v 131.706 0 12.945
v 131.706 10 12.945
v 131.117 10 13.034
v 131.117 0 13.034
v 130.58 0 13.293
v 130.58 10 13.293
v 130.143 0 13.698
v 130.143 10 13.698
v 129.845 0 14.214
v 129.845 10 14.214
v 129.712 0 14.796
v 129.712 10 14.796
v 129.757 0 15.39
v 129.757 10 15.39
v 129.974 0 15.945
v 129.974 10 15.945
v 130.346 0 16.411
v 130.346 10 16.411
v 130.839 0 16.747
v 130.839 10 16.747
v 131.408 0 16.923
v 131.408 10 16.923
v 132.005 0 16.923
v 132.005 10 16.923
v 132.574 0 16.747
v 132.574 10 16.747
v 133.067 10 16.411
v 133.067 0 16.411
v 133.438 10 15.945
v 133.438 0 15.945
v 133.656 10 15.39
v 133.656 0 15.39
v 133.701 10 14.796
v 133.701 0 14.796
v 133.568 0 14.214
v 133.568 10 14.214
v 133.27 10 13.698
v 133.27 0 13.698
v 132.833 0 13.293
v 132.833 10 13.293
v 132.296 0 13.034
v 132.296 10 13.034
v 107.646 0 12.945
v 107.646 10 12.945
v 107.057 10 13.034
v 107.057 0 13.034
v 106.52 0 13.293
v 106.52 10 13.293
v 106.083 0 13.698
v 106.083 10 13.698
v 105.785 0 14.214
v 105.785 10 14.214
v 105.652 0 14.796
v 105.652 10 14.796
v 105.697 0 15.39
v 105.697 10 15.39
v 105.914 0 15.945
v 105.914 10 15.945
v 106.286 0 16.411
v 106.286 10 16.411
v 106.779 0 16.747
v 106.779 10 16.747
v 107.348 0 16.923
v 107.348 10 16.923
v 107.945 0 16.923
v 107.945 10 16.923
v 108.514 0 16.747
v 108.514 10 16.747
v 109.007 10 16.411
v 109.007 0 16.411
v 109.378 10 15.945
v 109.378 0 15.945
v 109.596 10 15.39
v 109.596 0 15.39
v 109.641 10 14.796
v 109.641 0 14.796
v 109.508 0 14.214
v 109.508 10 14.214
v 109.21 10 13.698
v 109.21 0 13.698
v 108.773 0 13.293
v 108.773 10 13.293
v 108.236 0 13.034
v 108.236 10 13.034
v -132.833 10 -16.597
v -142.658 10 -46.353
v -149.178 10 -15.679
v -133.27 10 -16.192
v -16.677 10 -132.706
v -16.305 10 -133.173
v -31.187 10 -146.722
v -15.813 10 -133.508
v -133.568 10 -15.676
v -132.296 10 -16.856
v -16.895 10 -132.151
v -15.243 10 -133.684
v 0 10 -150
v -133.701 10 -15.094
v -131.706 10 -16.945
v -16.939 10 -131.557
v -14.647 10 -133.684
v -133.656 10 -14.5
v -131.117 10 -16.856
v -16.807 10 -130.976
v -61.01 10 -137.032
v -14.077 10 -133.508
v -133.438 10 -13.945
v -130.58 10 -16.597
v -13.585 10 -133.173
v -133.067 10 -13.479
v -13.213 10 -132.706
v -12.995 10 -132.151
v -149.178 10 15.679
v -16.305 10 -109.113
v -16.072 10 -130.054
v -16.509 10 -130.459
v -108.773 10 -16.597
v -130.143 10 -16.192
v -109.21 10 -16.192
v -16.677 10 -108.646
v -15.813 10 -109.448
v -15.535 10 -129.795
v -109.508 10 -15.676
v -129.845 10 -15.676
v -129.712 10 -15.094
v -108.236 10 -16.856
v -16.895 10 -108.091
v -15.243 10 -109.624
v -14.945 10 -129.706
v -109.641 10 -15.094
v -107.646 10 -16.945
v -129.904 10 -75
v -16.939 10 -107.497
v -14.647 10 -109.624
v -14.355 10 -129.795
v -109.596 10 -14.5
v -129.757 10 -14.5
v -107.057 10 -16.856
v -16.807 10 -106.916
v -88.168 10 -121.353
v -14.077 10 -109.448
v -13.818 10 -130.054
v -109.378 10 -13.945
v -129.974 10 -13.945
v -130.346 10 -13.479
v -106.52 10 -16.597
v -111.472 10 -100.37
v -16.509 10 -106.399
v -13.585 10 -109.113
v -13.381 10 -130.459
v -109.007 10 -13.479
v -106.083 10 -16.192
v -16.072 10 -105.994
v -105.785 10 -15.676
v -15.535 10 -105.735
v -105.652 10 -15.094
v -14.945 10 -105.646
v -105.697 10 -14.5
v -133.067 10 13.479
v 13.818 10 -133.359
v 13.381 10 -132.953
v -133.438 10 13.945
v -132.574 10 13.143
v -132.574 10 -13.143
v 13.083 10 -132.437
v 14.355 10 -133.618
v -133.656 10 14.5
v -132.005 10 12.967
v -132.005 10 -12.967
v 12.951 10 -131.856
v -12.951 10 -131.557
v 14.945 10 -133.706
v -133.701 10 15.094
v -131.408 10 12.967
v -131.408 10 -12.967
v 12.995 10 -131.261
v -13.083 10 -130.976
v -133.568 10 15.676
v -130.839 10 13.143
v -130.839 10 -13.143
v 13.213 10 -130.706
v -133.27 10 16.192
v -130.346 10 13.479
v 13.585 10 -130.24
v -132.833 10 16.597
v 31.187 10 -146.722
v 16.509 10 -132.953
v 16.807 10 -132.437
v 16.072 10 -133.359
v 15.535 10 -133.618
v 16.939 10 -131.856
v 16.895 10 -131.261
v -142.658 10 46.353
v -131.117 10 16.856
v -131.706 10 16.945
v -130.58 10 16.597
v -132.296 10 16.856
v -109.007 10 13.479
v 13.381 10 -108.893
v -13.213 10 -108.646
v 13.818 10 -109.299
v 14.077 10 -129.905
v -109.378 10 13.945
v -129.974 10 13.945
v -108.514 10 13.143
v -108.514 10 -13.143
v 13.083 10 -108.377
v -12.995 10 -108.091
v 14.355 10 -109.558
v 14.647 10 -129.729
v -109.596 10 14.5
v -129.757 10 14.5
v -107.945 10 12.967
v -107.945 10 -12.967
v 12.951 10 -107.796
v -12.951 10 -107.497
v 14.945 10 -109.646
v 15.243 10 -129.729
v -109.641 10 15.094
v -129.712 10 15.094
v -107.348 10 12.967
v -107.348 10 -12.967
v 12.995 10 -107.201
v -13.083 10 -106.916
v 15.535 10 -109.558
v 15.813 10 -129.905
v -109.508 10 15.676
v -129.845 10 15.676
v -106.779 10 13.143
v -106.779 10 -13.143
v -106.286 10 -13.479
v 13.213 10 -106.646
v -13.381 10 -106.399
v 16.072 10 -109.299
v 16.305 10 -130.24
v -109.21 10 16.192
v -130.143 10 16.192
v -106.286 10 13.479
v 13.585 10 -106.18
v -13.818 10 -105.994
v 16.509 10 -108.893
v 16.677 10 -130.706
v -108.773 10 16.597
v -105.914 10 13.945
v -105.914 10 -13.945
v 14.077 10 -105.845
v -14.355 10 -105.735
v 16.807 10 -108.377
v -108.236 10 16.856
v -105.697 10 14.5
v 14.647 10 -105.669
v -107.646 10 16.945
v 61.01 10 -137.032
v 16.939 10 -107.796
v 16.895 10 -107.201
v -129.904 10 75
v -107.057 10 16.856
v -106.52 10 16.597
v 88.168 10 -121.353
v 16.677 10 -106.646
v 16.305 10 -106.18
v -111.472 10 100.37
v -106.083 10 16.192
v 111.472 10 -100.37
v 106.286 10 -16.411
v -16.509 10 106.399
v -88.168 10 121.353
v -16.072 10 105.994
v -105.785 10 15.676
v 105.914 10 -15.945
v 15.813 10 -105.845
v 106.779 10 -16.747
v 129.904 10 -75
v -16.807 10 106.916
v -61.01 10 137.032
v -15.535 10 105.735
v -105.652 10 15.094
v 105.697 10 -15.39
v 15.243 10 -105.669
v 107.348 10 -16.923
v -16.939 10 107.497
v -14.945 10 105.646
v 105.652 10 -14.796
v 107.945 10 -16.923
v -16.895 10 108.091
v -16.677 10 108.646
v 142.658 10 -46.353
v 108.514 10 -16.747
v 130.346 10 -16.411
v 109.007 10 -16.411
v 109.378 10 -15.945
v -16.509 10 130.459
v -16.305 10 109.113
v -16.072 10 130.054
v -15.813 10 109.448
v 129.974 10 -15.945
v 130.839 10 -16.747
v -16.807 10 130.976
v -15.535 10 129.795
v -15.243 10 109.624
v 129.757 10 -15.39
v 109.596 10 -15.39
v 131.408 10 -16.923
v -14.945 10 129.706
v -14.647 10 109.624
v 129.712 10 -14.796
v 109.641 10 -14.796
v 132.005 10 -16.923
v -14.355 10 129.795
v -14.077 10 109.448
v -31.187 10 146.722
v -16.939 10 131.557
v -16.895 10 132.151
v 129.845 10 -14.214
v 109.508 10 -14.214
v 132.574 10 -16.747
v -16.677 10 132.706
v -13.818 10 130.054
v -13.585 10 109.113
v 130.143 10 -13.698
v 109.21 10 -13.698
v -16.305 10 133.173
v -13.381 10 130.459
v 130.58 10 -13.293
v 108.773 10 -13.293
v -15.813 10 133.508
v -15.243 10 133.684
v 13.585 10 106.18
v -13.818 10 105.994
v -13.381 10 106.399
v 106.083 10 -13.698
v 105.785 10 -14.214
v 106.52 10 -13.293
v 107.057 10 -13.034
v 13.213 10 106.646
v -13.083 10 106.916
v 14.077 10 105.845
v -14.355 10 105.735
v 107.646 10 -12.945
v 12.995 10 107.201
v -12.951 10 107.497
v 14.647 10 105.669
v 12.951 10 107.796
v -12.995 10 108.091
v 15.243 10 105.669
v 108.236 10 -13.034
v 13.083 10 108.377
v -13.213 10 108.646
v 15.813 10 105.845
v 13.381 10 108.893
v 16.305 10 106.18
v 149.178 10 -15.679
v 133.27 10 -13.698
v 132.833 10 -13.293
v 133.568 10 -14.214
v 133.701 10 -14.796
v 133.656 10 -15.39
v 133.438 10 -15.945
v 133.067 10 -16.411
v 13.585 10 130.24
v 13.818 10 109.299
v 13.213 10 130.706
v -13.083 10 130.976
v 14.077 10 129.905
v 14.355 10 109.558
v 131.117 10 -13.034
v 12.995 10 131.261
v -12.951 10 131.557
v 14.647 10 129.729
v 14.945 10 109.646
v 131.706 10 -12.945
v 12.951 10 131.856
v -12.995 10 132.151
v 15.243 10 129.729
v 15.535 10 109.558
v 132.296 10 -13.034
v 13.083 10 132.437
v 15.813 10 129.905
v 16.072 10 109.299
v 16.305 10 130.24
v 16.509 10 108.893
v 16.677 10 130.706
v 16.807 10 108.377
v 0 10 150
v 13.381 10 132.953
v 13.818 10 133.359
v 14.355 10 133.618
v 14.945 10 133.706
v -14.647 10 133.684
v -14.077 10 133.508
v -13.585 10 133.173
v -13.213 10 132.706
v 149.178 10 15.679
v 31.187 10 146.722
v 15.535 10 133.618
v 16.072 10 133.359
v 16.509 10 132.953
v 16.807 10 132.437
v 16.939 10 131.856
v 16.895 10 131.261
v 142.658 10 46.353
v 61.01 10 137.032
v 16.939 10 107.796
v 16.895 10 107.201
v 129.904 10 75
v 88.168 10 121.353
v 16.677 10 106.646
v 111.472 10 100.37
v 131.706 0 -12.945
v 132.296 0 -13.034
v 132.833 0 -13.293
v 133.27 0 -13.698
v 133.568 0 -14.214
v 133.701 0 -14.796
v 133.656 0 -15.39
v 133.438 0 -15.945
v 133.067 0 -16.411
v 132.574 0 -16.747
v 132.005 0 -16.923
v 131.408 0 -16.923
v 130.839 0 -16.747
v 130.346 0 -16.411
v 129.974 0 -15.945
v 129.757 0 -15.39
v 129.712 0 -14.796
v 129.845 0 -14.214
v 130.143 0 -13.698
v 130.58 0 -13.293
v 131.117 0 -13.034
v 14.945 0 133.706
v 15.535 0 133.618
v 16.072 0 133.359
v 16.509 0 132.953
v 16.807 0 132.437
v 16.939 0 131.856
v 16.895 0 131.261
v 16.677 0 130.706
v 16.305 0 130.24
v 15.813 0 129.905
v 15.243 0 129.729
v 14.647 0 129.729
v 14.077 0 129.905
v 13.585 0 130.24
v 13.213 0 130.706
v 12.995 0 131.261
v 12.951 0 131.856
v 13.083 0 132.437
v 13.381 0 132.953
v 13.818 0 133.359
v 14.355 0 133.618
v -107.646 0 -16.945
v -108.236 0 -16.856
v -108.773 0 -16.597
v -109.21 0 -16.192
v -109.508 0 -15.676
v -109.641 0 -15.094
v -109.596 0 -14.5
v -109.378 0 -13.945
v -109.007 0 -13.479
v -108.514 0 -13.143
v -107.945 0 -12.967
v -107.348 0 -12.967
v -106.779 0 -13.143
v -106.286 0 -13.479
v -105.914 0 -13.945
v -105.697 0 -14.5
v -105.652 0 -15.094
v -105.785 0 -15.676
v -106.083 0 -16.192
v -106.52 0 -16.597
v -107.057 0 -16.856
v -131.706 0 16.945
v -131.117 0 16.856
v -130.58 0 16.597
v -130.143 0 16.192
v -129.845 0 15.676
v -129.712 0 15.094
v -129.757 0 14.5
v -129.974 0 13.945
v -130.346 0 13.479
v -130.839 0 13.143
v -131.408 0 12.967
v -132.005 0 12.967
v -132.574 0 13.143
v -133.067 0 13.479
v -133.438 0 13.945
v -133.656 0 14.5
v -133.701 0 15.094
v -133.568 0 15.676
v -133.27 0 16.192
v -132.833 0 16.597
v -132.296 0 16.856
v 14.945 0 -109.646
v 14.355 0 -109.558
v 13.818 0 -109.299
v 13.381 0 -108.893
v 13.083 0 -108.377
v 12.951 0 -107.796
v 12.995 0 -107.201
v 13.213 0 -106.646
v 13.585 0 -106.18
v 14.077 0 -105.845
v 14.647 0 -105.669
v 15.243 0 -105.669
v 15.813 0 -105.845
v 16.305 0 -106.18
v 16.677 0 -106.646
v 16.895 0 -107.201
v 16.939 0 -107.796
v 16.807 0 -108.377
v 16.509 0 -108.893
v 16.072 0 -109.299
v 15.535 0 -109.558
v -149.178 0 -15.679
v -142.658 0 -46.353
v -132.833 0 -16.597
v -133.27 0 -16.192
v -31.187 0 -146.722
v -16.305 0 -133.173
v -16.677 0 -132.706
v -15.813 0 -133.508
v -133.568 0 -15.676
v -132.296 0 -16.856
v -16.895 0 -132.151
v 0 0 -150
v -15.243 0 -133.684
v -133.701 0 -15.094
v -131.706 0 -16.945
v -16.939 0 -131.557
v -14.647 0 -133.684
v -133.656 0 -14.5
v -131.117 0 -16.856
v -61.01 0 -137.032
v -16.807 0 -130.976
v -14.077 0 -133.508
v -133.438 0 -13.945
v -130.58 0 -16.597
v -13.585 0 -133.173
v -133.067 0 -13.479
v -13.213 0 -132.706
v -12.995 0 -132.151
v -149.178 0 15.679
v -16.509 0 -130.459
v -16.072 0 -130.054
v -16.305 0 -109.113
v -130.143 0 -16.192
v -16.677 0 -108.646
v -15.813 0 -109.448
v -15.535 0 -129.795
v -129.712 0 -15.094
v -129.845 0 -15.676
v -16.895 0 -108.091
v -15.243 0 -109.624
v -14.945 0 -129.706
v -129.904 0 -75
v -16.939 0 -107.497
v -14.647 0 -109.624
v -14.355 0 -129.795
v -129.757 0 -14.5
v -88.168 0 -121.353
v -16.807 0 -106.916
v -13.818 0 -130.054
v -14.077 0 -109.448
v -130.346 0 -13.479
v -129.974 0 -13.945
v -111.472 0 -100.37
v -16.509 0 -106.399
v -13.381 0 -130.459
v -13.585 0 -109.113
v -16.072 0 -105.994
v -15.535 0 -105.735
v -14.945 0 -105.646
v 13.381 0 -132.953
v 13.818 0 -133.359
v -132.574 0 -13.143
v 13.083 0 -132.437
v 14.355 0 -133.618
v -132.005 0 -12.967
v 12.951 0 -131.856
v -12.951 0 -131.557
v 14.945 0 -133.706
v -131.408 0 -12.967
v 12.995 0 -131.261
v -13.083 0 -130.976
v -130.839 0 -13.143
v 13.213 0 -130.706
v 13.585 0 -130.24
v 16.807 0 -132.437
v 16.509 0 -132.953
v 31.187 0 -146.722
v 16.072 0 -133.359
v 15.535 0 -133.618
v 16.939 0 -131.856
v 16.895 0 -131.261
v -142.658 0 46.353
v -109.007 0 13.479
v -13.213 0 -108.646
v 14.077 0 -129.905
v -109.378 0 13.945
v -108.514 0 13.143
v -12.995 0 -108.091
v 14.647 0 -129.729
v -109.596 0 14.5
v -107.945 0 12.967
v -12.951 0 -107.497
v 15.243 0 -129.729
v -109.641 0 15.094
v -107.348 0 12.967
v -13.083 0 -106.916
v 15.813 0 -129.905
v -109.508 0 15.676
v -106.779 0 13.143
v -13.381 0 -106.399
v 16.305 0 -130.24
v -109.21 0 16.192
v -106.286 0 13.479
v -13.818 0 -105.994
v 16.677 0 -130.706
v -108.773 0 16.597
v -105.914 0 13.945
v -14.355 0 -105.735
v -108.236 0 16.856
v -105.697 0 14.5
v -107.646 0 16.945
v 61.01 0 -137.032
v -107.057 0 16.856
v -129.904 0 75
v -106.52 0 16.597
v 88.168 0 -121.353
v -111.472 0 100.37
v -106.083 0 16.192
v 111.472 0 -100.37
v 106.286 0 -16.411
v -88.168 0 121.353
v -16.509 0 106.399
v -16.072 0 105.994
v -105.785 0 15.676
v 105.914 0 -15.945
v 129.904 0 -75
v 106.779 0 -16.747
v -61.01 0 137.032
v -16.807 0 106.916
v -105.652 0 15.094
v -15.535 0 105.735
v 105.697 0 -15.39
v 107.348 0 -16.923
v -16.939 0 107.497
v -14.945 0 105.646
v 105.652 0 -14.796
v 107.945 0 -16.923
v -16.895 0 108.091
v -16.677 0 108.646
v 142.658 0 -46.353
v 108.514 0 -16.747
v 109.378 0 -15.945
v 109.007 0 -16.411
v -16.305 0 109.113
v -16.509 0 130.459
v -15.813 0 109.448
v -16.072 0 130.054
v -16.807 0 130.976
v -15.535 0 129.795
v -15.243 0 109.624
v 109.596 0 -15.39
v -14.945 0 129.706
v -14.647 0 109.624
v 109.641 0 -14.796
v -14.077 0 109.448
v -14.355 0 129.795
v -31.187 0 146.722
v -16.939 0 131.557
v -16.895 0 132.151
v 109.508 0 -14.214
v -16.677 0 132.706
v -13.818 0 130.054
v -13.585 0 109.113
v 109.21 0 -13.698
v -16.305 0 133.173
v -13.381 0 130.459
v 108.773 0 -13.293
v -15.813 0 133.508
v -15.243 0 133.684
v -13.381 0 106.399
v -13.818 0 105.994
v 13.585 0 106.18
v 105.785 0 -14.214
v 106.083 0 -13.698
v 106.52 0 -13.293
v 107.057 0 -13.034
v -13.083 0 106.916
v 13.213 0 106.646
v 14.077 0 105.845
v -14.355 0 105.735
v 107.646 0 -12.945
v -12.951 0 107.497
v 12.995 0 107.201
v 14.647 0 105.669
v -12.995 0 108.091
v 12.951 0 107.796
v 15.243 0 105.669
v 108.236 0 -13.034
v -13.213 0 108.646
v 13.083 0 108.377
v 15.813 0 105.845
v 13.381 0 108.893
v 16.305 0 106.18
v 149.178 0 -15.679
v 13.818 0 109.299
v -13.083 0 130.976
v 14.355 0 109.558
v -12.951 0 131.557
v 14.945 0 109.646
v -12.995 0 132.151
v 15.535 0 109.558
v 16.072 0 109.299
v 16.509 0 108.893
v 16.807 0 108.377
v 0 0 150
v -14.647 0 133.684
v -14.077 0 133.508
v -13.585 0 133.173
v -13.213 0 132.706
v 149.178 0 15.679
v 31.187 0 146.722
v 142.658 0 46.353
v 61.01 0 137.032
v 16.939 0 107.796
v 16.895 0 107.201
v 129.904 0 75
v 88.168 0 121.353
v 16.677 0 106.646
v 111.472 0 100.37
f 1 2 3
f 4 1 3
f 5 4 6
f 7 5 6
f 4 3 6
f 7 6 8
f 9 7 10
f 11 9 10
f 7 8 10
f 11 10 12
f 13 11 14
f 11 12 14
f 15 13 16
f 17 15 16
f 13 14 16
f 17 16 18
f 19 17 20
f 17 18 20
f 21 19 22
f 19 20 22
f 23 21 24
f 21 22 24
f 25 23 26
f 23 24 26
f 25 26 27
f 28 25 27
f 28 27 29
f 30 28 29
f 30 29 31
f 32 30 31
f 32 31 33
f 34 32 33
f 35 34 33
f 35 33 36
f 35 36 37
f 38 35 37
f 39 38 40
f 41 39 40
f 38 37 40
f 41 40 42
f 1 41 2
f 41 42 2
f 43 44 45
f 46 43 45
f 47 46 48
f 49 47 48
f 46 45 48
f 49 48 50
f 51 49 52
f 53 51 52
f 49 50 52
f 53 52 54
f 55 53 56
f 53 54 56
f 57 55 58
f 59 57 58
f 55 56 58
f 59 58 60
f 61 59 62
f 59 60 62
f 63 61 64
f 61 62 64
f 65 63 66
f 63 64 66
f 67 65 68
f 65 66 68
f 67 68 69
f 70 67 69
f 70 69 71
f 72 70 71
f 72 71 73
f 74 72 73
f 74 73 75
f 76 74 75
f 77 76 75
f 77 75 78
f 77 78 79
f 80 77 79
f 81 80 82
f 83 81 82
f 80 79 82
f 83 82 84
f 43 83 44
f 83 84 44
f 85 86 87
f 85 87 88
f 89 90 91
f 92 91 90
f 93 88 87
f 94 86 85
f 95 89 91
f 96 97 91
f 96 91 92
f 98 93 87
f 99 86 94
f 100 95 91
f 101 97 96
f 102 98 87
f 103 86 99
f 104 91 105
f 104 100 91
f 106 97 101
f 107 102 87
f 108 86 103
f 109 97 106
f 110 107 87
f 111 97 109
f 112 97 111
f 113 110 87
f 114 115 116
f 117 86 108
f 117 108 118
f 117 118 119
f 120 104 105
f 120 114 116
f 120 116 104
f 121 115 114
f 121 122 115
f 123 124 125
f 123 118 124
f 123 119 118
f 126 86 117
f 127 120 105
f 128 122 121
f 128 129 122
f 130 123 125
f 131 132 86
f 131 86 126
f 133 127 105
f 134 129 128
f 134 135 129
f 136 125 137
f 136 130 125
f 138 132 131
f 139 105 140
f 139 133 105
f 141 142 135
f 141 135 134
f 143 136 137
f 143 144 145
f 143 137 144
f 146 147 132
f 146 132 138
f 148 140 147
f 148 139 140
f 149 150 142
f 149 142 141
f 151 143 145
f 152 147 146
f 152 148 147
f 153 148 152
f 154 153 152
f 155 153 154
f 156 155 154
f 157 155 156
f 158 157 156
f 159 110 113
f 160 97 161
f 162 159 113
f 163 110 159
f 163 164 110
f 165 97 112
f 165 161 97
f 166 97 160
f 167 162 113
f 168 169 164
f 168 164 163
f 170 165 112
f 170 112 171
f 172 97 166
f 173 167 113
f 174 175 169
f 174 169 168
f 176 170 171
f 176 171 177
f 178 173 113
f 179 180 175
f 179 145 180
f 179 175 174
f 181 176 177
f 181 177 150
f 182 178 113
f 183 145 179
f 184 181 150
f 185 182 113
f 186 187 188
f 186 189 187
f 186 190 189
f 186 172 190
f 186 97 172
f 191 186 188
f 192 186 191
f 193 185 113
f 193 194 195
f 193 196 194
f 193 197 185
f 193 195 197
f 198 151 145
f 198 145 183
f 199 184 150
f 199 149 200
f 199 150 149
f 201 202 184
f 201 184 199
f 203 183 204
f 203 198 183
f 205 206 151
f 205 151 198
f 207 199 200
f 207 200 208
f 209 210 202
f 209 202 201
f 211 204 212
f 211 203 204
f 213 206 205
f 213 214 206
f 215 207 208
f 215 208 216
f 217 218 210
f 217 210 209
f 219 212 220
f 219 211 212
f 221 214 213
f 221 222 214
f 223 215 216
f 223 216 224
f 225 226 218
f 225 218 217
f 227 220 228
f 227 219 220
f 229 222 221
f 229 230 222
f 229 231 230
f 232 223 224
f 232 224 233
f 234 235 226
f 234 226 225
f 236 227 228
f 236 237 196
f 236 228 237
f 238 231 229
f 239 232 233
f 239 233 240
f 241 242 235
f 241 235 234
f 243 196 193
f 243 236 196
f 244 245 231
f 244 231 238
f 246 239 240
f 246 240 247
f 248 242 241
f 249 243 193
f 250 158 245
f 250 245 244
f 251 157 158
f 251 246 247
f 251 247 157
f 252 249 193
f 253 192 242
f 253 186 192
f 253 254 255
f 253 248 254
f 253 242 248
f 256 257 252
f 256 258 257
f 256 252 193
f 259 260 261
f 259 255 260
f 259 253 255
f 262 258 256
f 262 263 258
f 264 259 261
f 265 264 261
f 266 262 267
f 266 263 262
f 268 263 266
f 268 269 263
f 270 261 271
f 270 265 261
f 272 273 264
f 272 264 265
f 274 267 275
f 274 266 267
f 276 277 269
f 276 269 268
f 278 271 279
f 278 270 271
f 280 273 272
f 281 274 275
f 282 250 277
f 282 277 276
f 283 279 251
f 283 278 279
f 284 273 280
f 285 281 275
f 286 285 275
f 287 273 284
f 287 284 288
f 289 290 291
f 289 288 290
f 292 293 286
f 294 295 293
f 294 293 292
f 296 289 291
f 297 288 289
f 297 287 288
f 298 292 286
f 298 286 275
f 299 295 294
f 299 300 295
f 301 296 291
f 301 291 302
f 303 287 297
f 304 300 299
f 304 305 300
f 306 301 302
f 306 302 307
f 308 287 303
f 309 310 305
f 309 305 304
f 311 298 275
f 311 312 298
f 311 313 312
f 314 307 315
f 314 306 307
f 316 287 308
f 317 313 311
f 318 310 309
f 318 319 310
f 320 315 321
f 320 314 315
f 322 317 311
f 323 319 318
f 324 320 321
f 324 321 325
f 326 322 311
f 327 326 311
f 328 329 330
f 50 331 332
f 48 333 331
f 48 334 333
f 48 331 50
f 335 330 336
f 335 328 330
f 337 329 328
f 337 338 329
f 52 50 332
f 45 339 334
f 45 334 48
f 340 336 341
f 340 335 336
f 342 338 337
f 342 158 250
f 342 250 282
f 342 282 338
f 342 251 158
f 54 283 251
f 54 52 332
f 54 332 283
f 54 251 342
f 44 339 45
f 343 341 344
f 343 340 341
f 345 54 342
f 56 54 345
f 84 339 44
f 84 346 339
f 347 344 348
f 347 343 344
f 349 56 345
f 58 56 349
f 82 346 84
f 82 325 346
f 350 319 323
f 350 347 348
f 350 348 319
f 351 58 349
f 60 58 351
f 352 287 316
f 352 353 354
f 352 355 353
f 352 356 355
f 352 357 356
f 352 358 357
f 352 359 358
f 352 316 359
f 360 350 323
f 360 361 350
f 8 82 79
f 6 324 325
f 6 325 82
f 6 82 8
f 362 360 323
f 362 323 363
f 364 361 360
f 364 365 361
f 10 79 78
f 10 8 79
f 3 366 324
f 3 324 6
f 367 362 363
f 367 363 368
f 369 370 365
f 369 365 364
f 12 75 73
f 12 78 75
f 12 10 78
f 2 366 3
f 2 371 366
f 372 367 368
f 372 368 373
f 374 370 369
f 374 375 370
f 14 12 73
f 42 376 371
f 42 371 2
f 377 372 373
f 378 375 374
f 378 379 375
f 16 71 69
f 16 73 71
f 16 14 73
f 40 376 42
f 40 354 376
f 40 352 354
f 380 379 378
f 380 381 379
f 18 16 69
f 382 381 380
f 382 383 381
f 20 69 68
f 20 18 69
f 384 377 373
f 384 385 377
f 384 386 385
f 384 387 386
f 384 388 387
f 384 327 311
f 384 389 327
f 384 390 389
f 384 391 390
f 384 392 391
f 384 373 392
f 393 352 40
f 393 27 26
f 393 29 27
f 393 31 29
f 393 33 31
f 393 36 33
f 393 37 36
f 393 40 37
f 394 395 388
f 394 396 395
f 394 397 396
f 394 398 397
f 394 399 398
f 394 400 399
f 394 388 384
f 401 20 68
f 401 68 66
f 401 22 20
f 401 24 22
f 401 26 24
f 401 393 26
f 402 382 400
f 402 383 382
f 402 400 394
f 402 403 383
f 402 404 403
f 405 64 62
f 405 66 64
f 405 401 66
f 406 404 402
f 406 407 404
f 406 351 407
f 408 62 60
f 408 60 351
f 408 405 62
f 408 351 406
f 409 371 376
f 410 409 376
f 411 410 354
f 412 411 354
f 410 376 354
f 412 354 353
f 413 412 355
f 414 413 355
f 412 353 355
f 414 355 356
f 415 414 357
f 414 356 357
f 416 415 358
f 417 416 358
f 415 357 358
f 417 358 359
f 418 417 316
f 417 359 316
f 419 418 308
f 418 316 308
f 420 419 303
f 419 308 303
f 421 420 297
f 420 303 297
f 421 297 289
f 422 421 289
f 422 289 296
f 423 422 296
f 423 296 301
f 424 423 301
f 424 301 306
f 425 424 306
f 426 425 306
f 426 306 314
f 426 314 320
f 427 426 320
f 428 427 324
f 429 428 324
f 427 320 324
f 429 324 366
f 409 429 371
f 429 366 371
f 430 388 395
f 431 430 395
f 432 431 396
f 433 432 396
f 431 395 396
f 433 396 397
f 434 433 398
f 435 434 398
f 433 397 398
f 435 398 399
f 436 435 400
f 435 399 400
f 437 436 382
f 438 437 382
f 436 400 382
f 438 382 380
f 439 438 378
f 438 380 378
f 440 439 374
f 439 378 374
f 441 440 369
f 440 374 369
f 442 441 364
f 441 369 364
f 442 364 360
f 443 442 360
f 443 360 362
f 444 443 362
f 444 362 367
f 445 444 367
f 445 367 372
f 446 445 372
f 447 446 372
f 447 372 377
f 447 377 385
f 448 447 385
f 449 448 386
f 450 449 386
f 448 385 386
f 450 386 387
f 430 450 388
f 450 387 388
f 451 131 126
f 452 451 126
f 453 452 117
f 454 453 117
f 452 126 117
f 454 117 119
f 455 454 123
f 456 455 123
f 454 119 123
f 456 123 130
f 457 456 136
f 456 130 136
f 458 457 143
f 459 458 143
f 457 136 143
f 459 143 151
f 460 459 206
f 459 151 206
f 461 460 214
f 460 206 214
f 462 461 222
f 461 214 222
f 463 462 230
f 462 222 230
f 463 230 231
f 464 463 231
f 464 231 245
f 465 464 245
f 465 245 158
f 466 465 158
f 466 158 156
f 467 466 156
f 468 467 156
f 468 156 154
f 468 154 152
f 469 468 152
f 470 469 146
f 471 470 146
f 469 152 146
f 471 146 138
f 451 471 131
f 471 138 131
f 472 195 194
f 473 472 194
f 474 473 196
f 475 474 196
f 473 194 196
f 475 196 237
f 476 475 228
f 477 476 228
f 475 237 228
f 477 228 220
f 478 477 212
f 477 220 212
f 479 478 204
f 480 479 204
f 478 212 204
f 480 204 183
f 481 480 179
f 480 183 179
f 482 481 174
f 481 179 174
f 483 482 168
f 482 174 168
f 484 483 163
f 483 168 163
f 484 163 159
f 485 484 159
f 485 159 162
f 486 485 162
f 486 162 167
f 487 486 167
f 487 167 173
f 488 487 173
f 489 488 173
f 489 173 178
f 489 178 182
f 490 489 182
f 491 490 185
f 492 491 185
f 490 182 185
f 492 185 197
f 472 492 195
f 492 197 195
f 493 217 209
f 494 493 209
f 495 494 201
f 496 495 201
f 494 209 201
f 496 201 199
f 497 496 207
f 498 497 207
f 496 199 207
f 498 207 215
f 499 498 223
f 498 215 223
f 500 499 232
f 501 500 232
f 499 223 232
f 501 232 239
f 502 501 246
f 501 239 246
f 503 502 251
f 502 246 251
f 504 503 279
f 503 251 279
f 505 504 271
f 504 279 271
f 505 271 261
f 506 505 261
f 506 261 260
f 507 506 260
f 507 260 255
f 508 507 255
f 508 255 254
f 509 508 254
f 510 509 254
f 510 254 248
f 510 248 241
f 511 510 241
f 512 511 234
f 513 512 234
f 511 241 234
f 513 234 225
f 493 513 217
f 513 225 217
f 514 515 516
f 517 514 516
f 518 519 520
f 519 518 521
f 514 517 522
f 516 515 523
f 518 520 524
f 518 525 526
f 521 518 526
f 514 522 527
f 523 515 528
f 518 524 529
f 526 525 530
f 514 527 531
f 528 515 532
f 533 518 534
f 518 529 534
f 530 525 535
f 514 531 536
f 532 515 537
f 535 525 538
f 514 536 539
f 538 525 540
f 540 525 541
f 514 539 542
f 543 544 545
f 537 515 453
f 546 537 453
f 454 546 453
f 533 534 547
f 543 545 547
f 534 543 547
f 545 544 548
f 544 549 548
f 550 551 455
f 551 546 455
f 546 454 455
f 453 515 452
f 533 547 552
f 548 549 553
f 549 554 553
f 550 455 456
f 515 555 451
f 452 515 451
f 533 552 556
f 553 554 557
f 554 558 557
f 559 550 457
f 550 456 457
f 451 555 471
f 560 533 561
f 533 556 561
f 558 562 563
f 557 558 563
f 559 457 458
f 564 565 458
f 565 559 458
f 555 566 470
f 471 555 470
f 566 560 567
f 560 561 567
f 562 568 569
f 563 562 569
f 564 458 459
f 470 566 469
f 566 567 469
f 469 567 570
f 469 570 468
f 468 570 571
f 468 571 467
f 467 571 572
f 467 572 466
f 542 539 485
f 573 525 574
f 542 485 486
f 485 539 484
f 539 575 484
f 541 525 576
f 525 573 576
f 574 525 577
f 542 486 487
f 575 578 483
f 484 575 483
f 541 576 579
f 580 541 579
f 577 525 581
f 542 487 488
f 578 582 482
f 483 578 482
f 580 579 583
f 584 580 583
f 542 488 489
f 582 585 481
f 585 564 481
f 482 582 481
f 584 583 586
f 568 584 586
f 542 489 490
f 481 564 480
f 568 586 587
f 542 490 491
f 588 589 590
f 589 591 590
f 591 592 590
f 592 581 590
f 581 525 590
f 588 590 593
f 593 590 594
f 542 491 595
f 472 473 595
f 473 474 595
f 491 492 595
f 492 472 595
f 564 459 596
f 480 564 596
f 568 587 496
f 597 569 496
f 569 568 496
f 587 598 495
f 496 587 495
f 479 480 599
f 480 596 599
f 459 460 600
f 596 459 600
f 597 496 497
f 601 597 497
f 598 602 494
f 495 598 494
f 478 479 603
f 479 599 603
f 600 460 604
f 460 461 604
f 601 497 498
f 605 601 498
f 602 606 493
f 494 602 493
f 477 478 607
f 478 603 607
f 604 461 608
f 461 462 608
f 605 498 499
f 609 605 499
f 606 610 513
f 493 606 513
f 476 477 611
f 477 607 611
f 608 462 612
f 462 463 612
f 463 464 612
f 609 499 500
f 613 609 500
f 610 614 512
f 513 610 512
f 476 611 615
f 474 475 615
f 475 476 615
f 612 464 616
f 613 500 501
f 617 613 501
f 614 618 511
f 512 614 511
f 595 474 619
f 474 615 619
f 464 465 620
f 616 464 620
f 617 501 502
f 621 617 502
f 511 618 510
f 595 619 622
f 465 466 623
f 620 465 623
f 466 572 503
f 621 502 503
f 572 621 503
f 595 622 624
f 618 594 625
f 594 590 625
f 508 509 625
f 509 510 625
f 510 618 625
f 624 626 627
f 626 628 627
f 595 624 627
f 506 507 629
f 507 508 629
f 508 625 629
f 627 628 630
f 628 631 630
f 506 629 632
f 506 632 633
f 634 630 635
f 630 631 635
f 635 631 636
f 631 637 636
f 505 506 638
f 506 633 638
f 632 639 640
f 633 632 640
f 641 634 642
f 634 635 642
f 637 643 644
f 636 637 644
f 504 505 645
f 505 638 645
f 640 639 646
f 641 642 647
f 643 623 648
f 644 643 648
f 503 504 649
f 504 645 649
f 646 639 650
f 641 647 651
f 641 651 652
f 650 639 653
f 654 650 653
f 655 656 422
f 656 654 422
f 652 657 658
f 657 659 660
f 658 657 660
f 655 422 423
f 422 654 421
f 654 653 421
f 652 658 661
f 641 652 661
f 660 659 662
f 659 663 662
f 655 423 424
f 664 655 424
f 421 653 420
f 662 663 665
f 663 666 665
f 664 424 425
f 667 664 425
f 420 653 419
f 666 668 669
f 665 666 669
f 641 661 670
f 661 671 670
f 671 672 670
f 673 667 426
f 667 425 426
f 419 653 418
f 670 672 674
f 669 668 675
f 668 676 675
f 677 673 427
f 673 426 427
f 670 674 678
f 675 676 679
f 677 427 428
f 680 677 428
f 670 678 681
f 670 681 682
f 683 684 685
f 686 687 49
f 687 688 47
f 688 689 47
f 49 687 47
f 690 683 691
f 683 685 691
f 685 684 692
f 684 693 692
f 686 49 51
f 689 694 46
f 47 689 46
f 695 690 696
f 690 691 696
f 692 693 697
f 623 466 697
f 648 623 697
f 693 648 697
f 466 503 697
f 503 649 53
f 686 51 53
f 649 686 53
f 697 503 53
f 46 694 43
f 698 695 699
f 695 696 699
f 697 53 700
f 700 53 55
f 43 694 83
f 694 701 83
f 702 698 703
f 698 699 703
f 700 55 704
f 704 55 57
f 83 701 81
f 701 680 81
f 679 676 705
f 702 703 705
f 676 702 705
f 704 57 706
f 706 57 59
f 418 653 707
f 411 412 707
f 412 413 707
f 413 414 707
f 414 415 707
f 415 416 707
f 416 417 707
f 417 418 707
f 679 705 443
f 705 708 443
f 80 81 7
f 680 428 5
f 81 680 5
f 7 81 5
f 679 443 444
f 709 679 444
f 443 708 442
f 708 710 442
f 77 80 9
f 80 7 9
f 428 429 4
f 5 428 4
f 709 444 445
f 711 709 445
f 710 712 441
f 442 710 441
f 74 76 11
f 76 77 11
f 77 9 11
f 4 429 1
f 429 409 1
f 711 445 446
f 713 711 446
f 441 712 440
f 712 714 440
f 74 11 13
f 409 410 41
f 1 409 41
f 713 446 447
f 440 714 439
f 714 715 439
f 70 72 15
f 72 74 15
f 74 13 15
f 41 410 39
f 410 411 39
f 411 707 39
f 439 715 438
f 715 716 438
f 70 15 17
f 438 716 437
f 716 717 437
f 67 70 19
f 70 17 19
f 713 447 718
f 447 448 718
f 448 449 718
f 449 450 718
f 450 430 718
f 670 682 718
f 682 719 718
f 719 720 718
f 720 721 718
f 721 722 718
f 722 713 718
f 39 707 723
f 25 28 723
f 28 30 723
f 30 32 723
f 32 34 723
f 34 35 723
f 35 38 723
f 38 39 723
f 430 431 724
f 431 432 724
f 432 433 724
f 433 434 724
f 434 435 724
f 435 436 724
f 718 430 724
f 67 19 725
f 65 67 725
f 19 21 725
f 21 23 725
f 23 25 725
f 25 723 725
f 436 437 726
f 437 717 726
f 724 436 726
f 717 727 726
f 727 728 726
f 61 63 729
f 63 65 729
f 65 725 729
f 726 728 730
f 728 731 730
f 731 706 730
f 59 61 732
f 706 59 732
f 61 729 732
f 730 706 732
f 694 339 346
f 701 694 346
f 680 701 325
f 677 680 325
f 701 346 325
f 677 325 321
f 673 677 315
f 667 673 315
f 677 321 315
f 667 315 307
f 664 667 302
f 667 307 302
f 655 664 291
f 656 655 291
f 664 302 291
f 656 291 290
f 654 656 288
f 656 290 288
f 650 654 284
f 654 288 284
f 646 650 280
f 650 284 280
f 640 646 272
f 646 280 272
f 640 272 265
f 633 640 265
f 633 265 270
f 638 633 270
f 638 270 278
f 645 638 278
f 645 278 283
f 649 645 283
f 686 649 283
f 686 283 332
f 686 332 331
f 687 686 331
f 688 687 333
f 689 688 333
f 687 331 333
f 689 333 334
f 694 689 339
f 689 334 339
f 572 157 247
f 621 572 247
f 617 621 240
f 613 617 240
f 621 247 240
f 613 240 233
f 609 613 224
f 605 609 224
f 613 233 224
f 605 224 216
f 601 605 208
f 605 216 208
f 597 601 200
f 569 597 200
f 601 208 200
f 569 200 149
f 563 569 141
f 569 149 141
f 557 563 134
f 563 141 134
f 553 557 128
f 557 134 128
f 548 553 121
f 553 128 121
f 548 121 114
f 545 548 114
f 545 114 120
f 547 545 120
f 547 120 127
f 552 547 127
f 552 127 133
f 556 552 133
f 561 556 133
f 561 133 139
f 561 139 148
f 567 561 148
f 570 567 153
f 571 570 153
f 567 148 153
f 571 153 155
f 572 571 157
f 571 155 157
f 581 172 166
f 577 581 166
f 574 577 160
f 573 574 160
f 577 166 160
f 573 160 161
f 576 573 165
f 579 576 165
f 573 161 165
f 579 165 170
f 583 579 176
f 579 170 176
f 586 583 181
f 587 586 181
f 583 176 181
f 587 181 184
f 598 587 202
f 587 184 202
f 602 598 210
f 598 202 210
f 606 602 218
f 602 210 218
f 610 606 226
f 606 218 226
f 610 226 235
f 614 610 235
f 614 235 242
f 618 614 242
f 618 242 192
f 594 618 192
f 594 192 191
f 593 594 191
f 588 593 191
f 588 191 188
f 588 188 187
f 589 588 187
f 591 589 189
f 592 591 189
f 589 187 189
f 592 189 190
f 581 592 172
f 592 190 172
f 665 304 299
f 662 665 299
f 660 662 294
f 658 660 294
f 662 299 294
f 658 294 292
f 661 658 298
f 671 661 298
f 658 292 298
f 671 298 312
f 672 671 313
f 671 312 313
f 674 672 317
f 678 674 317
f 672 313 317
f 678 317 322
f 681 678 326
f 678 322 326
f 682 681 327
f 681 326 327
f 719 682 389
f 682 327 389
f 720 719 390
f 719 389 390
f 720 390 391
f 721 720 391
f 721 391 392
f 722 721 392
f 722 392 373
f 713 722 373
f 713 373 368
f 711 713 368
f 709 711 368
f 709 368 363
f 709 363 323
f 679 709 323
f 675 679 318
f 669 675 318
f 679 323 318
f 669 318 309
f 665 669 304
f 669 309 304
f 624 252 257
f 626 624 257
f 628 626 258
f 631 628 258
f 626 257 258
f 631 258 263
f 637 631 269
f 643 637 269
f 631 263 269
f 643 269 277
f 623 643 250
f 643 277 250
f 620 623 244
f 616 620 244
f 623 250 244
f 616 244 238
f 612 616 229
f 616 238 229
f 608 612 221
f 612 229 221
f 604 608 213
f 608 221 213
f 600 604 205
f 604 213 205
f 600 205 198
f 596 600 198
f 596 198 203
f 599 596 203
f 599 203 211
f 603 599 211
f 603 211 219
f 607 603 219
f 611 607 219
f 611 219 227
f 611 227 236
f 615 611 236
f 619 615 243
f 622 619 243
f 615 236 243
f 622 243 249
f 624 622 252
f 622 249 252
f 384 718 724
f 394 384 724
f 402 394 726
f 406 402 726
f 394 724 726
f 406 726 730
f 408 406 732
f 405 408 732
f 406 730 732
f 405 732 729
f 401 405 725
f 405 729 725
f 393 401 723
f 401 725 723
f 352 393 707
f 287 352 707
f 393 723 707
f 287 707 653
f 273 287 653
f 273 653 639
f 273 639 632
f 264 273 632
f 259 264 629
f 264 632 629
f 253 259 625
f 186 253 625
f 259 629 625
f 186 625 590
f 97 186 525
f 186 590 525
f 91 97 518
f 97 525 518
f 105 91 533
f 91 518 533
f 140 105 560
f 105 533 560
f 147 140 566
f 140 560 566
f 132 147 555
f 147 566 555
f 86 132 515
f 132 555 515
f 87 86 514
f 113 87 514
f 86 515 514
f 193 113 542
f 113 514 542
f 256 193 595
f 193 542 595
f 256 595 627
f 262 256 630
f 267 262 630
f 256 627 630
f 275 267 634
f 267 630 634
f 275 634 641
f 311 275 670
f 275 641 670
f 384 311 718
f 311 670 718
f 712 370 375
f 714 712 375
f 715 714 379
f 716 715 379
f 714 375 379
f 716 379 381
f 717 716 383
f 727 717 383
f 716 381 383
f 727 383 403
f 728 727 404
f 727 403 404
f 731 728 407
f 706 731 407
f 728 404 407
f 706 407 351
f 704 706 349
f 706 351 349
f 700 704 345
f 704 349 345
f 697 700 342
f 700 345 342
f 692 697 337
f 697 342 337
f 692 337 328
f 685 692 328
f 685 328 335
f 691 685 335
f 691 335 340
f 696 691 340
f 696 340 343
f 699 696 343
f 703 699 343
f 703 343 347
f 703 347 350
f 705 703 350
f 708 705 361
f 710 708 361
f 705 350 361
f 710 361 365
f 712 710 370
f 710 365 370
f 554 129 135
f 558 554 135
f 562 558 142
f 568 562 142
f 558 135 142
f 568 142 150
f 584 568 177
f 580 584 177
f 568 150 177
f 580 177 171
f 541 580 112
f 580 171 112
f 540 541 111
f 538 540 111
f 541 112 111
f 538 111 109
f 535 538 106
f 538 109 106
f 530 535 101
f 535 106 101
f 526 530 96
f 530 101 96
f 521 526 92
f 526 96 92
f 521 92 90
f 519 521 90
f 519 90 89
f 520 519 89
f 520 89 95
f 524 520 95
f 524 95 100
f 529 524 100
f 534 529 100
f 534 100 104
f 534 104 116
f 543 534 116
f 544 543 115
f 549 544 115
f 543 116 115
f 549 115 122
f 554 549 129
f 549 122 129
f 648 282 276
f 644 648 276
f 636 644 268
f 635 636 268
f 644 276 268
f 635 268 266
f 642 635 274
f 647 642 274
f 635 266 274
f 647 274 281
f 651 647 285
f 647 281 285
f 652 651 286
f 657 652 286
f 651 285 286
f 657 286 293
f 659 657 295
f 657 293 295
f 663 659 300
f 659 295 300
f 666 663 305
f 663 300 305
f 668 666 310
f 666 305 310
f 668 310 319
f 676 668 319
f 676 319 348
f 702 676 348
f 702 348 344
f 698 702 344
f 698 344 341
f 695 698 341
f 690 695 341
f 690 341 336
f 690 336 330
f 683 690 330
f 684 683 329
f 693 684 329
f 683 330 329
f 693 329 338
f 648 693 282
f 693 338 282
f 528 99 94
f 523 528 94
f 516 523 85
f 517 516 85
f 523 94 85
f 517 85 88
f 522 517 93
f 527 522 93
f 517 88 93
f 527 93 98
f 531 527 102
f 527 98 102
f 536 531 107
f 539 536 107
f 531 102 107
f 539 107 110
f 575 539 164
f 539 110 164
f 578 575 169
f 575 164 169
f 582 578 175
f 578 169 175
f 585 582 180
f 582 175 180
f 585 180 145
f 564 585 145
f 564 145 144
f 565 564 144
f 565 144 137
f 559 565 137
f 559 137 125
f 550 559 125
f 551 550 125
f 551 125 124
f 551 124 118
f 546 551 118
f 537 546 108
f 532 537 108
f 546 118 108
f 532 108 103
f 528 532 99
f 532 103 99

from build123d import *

# Parameters (mm, degrees)
SKETCH1_R           = 150
BOSS_EXTRUDE1_DEPTH = 10
SKETCH2_R           = 2
CUT_EXTRUDE1_DEPTH  = 10


with BuildPart() as part:
    # Sketch1 → Boss-Extrude1 (new body)
    with BuildSketch(Plane(origin=(0, 0, 0), x_dir=(1, 0, 0), z_dir=(0, 1, 0))):
        with Locations(Location((0, 0, 0), (0, 0, 270))):
            Circle(SKETCH1_R)
    extrude(amount=BOSS_EXTRUDE1_DEPTH)

    # Sketch2 → Cut-Extrude1 (cut)
    with BuildSketch(Plane(origin=(0, 10, 0), x_dir=(1, 0, 0), z_dir=(0, 1, 0))):
        with Locations(Location((-14.945, 131.706442493, 0), (0, 0, 270))):
            Circle(SKETCH2_R)
        with Locations(Location((-14.945, 107.646442493, 0), (0, 0, 270))):
            Circle(SKETCH2_R)
        with Locations(Location((14.945, 107.646442493, 0), (0, 0, 90))):
            Circle(SKETCH2_R)
        with Locations(Location((14.945, 131.706442493, 0), (0, 0, 90))):
            Circle(SKETCH2_R)
        with Locations(Location((131.706442493, 14.945, 0), (0, 0, 270))):
            Circle(SKETCH2_R)
        with Locations(Location((131.706442493, -14.945, 0), (0, 0, 90))):
            Circle(SKETCH2_R)
        with Locations(Location((107.646442493, -14.945, 0), (0, 0, 90))):
            Circle(SKETCH2_R)
        with Locations(Location((107.646442493, 14.945, 0), (0, 0, 270))):
            Circle(SKETCH2_R)
        with Locations(Location((14.945, -131.706442493, 0), (0, 0, 270))):
            Circle(SKETCH2_R)
        with Locations(Location((-14.945, -131.706442493, 0), (0, 0, 90))):
            Circle(SKETCH2_R)
        with Locations(Location((-14.945, -107.646442493, 0), (0, 0, 90))):
            Circle(SKETCH2_R)
        with Locations(Location((14.945, -107.646442493, 0), (0, 0, 270))):
            Circle(SKETCH2_R)
        with Locations(Location((-131.706442493, -14.945, 0), (0, 0, 270))):
            Circle(SKETCH2_R)
        with Locations(Location((-131.706442493, 14.945, 0), (0, 0, 90))):
            Circle(SKETCH2_R)
        with Locations(Location((-107.646442493, 14.945, 0), (0, 0, 90))):
            Circle(SKETCH2_R)
        with Locations(Location((-107.646442493, -14.945, 0), (0, 0, 270))):
            Circle(SKETCH2_R)
    extrude(amount=-CUT_EXTRUDE1_DEPTH, mode=Mode.SUBTRACT)


solid = part.part
